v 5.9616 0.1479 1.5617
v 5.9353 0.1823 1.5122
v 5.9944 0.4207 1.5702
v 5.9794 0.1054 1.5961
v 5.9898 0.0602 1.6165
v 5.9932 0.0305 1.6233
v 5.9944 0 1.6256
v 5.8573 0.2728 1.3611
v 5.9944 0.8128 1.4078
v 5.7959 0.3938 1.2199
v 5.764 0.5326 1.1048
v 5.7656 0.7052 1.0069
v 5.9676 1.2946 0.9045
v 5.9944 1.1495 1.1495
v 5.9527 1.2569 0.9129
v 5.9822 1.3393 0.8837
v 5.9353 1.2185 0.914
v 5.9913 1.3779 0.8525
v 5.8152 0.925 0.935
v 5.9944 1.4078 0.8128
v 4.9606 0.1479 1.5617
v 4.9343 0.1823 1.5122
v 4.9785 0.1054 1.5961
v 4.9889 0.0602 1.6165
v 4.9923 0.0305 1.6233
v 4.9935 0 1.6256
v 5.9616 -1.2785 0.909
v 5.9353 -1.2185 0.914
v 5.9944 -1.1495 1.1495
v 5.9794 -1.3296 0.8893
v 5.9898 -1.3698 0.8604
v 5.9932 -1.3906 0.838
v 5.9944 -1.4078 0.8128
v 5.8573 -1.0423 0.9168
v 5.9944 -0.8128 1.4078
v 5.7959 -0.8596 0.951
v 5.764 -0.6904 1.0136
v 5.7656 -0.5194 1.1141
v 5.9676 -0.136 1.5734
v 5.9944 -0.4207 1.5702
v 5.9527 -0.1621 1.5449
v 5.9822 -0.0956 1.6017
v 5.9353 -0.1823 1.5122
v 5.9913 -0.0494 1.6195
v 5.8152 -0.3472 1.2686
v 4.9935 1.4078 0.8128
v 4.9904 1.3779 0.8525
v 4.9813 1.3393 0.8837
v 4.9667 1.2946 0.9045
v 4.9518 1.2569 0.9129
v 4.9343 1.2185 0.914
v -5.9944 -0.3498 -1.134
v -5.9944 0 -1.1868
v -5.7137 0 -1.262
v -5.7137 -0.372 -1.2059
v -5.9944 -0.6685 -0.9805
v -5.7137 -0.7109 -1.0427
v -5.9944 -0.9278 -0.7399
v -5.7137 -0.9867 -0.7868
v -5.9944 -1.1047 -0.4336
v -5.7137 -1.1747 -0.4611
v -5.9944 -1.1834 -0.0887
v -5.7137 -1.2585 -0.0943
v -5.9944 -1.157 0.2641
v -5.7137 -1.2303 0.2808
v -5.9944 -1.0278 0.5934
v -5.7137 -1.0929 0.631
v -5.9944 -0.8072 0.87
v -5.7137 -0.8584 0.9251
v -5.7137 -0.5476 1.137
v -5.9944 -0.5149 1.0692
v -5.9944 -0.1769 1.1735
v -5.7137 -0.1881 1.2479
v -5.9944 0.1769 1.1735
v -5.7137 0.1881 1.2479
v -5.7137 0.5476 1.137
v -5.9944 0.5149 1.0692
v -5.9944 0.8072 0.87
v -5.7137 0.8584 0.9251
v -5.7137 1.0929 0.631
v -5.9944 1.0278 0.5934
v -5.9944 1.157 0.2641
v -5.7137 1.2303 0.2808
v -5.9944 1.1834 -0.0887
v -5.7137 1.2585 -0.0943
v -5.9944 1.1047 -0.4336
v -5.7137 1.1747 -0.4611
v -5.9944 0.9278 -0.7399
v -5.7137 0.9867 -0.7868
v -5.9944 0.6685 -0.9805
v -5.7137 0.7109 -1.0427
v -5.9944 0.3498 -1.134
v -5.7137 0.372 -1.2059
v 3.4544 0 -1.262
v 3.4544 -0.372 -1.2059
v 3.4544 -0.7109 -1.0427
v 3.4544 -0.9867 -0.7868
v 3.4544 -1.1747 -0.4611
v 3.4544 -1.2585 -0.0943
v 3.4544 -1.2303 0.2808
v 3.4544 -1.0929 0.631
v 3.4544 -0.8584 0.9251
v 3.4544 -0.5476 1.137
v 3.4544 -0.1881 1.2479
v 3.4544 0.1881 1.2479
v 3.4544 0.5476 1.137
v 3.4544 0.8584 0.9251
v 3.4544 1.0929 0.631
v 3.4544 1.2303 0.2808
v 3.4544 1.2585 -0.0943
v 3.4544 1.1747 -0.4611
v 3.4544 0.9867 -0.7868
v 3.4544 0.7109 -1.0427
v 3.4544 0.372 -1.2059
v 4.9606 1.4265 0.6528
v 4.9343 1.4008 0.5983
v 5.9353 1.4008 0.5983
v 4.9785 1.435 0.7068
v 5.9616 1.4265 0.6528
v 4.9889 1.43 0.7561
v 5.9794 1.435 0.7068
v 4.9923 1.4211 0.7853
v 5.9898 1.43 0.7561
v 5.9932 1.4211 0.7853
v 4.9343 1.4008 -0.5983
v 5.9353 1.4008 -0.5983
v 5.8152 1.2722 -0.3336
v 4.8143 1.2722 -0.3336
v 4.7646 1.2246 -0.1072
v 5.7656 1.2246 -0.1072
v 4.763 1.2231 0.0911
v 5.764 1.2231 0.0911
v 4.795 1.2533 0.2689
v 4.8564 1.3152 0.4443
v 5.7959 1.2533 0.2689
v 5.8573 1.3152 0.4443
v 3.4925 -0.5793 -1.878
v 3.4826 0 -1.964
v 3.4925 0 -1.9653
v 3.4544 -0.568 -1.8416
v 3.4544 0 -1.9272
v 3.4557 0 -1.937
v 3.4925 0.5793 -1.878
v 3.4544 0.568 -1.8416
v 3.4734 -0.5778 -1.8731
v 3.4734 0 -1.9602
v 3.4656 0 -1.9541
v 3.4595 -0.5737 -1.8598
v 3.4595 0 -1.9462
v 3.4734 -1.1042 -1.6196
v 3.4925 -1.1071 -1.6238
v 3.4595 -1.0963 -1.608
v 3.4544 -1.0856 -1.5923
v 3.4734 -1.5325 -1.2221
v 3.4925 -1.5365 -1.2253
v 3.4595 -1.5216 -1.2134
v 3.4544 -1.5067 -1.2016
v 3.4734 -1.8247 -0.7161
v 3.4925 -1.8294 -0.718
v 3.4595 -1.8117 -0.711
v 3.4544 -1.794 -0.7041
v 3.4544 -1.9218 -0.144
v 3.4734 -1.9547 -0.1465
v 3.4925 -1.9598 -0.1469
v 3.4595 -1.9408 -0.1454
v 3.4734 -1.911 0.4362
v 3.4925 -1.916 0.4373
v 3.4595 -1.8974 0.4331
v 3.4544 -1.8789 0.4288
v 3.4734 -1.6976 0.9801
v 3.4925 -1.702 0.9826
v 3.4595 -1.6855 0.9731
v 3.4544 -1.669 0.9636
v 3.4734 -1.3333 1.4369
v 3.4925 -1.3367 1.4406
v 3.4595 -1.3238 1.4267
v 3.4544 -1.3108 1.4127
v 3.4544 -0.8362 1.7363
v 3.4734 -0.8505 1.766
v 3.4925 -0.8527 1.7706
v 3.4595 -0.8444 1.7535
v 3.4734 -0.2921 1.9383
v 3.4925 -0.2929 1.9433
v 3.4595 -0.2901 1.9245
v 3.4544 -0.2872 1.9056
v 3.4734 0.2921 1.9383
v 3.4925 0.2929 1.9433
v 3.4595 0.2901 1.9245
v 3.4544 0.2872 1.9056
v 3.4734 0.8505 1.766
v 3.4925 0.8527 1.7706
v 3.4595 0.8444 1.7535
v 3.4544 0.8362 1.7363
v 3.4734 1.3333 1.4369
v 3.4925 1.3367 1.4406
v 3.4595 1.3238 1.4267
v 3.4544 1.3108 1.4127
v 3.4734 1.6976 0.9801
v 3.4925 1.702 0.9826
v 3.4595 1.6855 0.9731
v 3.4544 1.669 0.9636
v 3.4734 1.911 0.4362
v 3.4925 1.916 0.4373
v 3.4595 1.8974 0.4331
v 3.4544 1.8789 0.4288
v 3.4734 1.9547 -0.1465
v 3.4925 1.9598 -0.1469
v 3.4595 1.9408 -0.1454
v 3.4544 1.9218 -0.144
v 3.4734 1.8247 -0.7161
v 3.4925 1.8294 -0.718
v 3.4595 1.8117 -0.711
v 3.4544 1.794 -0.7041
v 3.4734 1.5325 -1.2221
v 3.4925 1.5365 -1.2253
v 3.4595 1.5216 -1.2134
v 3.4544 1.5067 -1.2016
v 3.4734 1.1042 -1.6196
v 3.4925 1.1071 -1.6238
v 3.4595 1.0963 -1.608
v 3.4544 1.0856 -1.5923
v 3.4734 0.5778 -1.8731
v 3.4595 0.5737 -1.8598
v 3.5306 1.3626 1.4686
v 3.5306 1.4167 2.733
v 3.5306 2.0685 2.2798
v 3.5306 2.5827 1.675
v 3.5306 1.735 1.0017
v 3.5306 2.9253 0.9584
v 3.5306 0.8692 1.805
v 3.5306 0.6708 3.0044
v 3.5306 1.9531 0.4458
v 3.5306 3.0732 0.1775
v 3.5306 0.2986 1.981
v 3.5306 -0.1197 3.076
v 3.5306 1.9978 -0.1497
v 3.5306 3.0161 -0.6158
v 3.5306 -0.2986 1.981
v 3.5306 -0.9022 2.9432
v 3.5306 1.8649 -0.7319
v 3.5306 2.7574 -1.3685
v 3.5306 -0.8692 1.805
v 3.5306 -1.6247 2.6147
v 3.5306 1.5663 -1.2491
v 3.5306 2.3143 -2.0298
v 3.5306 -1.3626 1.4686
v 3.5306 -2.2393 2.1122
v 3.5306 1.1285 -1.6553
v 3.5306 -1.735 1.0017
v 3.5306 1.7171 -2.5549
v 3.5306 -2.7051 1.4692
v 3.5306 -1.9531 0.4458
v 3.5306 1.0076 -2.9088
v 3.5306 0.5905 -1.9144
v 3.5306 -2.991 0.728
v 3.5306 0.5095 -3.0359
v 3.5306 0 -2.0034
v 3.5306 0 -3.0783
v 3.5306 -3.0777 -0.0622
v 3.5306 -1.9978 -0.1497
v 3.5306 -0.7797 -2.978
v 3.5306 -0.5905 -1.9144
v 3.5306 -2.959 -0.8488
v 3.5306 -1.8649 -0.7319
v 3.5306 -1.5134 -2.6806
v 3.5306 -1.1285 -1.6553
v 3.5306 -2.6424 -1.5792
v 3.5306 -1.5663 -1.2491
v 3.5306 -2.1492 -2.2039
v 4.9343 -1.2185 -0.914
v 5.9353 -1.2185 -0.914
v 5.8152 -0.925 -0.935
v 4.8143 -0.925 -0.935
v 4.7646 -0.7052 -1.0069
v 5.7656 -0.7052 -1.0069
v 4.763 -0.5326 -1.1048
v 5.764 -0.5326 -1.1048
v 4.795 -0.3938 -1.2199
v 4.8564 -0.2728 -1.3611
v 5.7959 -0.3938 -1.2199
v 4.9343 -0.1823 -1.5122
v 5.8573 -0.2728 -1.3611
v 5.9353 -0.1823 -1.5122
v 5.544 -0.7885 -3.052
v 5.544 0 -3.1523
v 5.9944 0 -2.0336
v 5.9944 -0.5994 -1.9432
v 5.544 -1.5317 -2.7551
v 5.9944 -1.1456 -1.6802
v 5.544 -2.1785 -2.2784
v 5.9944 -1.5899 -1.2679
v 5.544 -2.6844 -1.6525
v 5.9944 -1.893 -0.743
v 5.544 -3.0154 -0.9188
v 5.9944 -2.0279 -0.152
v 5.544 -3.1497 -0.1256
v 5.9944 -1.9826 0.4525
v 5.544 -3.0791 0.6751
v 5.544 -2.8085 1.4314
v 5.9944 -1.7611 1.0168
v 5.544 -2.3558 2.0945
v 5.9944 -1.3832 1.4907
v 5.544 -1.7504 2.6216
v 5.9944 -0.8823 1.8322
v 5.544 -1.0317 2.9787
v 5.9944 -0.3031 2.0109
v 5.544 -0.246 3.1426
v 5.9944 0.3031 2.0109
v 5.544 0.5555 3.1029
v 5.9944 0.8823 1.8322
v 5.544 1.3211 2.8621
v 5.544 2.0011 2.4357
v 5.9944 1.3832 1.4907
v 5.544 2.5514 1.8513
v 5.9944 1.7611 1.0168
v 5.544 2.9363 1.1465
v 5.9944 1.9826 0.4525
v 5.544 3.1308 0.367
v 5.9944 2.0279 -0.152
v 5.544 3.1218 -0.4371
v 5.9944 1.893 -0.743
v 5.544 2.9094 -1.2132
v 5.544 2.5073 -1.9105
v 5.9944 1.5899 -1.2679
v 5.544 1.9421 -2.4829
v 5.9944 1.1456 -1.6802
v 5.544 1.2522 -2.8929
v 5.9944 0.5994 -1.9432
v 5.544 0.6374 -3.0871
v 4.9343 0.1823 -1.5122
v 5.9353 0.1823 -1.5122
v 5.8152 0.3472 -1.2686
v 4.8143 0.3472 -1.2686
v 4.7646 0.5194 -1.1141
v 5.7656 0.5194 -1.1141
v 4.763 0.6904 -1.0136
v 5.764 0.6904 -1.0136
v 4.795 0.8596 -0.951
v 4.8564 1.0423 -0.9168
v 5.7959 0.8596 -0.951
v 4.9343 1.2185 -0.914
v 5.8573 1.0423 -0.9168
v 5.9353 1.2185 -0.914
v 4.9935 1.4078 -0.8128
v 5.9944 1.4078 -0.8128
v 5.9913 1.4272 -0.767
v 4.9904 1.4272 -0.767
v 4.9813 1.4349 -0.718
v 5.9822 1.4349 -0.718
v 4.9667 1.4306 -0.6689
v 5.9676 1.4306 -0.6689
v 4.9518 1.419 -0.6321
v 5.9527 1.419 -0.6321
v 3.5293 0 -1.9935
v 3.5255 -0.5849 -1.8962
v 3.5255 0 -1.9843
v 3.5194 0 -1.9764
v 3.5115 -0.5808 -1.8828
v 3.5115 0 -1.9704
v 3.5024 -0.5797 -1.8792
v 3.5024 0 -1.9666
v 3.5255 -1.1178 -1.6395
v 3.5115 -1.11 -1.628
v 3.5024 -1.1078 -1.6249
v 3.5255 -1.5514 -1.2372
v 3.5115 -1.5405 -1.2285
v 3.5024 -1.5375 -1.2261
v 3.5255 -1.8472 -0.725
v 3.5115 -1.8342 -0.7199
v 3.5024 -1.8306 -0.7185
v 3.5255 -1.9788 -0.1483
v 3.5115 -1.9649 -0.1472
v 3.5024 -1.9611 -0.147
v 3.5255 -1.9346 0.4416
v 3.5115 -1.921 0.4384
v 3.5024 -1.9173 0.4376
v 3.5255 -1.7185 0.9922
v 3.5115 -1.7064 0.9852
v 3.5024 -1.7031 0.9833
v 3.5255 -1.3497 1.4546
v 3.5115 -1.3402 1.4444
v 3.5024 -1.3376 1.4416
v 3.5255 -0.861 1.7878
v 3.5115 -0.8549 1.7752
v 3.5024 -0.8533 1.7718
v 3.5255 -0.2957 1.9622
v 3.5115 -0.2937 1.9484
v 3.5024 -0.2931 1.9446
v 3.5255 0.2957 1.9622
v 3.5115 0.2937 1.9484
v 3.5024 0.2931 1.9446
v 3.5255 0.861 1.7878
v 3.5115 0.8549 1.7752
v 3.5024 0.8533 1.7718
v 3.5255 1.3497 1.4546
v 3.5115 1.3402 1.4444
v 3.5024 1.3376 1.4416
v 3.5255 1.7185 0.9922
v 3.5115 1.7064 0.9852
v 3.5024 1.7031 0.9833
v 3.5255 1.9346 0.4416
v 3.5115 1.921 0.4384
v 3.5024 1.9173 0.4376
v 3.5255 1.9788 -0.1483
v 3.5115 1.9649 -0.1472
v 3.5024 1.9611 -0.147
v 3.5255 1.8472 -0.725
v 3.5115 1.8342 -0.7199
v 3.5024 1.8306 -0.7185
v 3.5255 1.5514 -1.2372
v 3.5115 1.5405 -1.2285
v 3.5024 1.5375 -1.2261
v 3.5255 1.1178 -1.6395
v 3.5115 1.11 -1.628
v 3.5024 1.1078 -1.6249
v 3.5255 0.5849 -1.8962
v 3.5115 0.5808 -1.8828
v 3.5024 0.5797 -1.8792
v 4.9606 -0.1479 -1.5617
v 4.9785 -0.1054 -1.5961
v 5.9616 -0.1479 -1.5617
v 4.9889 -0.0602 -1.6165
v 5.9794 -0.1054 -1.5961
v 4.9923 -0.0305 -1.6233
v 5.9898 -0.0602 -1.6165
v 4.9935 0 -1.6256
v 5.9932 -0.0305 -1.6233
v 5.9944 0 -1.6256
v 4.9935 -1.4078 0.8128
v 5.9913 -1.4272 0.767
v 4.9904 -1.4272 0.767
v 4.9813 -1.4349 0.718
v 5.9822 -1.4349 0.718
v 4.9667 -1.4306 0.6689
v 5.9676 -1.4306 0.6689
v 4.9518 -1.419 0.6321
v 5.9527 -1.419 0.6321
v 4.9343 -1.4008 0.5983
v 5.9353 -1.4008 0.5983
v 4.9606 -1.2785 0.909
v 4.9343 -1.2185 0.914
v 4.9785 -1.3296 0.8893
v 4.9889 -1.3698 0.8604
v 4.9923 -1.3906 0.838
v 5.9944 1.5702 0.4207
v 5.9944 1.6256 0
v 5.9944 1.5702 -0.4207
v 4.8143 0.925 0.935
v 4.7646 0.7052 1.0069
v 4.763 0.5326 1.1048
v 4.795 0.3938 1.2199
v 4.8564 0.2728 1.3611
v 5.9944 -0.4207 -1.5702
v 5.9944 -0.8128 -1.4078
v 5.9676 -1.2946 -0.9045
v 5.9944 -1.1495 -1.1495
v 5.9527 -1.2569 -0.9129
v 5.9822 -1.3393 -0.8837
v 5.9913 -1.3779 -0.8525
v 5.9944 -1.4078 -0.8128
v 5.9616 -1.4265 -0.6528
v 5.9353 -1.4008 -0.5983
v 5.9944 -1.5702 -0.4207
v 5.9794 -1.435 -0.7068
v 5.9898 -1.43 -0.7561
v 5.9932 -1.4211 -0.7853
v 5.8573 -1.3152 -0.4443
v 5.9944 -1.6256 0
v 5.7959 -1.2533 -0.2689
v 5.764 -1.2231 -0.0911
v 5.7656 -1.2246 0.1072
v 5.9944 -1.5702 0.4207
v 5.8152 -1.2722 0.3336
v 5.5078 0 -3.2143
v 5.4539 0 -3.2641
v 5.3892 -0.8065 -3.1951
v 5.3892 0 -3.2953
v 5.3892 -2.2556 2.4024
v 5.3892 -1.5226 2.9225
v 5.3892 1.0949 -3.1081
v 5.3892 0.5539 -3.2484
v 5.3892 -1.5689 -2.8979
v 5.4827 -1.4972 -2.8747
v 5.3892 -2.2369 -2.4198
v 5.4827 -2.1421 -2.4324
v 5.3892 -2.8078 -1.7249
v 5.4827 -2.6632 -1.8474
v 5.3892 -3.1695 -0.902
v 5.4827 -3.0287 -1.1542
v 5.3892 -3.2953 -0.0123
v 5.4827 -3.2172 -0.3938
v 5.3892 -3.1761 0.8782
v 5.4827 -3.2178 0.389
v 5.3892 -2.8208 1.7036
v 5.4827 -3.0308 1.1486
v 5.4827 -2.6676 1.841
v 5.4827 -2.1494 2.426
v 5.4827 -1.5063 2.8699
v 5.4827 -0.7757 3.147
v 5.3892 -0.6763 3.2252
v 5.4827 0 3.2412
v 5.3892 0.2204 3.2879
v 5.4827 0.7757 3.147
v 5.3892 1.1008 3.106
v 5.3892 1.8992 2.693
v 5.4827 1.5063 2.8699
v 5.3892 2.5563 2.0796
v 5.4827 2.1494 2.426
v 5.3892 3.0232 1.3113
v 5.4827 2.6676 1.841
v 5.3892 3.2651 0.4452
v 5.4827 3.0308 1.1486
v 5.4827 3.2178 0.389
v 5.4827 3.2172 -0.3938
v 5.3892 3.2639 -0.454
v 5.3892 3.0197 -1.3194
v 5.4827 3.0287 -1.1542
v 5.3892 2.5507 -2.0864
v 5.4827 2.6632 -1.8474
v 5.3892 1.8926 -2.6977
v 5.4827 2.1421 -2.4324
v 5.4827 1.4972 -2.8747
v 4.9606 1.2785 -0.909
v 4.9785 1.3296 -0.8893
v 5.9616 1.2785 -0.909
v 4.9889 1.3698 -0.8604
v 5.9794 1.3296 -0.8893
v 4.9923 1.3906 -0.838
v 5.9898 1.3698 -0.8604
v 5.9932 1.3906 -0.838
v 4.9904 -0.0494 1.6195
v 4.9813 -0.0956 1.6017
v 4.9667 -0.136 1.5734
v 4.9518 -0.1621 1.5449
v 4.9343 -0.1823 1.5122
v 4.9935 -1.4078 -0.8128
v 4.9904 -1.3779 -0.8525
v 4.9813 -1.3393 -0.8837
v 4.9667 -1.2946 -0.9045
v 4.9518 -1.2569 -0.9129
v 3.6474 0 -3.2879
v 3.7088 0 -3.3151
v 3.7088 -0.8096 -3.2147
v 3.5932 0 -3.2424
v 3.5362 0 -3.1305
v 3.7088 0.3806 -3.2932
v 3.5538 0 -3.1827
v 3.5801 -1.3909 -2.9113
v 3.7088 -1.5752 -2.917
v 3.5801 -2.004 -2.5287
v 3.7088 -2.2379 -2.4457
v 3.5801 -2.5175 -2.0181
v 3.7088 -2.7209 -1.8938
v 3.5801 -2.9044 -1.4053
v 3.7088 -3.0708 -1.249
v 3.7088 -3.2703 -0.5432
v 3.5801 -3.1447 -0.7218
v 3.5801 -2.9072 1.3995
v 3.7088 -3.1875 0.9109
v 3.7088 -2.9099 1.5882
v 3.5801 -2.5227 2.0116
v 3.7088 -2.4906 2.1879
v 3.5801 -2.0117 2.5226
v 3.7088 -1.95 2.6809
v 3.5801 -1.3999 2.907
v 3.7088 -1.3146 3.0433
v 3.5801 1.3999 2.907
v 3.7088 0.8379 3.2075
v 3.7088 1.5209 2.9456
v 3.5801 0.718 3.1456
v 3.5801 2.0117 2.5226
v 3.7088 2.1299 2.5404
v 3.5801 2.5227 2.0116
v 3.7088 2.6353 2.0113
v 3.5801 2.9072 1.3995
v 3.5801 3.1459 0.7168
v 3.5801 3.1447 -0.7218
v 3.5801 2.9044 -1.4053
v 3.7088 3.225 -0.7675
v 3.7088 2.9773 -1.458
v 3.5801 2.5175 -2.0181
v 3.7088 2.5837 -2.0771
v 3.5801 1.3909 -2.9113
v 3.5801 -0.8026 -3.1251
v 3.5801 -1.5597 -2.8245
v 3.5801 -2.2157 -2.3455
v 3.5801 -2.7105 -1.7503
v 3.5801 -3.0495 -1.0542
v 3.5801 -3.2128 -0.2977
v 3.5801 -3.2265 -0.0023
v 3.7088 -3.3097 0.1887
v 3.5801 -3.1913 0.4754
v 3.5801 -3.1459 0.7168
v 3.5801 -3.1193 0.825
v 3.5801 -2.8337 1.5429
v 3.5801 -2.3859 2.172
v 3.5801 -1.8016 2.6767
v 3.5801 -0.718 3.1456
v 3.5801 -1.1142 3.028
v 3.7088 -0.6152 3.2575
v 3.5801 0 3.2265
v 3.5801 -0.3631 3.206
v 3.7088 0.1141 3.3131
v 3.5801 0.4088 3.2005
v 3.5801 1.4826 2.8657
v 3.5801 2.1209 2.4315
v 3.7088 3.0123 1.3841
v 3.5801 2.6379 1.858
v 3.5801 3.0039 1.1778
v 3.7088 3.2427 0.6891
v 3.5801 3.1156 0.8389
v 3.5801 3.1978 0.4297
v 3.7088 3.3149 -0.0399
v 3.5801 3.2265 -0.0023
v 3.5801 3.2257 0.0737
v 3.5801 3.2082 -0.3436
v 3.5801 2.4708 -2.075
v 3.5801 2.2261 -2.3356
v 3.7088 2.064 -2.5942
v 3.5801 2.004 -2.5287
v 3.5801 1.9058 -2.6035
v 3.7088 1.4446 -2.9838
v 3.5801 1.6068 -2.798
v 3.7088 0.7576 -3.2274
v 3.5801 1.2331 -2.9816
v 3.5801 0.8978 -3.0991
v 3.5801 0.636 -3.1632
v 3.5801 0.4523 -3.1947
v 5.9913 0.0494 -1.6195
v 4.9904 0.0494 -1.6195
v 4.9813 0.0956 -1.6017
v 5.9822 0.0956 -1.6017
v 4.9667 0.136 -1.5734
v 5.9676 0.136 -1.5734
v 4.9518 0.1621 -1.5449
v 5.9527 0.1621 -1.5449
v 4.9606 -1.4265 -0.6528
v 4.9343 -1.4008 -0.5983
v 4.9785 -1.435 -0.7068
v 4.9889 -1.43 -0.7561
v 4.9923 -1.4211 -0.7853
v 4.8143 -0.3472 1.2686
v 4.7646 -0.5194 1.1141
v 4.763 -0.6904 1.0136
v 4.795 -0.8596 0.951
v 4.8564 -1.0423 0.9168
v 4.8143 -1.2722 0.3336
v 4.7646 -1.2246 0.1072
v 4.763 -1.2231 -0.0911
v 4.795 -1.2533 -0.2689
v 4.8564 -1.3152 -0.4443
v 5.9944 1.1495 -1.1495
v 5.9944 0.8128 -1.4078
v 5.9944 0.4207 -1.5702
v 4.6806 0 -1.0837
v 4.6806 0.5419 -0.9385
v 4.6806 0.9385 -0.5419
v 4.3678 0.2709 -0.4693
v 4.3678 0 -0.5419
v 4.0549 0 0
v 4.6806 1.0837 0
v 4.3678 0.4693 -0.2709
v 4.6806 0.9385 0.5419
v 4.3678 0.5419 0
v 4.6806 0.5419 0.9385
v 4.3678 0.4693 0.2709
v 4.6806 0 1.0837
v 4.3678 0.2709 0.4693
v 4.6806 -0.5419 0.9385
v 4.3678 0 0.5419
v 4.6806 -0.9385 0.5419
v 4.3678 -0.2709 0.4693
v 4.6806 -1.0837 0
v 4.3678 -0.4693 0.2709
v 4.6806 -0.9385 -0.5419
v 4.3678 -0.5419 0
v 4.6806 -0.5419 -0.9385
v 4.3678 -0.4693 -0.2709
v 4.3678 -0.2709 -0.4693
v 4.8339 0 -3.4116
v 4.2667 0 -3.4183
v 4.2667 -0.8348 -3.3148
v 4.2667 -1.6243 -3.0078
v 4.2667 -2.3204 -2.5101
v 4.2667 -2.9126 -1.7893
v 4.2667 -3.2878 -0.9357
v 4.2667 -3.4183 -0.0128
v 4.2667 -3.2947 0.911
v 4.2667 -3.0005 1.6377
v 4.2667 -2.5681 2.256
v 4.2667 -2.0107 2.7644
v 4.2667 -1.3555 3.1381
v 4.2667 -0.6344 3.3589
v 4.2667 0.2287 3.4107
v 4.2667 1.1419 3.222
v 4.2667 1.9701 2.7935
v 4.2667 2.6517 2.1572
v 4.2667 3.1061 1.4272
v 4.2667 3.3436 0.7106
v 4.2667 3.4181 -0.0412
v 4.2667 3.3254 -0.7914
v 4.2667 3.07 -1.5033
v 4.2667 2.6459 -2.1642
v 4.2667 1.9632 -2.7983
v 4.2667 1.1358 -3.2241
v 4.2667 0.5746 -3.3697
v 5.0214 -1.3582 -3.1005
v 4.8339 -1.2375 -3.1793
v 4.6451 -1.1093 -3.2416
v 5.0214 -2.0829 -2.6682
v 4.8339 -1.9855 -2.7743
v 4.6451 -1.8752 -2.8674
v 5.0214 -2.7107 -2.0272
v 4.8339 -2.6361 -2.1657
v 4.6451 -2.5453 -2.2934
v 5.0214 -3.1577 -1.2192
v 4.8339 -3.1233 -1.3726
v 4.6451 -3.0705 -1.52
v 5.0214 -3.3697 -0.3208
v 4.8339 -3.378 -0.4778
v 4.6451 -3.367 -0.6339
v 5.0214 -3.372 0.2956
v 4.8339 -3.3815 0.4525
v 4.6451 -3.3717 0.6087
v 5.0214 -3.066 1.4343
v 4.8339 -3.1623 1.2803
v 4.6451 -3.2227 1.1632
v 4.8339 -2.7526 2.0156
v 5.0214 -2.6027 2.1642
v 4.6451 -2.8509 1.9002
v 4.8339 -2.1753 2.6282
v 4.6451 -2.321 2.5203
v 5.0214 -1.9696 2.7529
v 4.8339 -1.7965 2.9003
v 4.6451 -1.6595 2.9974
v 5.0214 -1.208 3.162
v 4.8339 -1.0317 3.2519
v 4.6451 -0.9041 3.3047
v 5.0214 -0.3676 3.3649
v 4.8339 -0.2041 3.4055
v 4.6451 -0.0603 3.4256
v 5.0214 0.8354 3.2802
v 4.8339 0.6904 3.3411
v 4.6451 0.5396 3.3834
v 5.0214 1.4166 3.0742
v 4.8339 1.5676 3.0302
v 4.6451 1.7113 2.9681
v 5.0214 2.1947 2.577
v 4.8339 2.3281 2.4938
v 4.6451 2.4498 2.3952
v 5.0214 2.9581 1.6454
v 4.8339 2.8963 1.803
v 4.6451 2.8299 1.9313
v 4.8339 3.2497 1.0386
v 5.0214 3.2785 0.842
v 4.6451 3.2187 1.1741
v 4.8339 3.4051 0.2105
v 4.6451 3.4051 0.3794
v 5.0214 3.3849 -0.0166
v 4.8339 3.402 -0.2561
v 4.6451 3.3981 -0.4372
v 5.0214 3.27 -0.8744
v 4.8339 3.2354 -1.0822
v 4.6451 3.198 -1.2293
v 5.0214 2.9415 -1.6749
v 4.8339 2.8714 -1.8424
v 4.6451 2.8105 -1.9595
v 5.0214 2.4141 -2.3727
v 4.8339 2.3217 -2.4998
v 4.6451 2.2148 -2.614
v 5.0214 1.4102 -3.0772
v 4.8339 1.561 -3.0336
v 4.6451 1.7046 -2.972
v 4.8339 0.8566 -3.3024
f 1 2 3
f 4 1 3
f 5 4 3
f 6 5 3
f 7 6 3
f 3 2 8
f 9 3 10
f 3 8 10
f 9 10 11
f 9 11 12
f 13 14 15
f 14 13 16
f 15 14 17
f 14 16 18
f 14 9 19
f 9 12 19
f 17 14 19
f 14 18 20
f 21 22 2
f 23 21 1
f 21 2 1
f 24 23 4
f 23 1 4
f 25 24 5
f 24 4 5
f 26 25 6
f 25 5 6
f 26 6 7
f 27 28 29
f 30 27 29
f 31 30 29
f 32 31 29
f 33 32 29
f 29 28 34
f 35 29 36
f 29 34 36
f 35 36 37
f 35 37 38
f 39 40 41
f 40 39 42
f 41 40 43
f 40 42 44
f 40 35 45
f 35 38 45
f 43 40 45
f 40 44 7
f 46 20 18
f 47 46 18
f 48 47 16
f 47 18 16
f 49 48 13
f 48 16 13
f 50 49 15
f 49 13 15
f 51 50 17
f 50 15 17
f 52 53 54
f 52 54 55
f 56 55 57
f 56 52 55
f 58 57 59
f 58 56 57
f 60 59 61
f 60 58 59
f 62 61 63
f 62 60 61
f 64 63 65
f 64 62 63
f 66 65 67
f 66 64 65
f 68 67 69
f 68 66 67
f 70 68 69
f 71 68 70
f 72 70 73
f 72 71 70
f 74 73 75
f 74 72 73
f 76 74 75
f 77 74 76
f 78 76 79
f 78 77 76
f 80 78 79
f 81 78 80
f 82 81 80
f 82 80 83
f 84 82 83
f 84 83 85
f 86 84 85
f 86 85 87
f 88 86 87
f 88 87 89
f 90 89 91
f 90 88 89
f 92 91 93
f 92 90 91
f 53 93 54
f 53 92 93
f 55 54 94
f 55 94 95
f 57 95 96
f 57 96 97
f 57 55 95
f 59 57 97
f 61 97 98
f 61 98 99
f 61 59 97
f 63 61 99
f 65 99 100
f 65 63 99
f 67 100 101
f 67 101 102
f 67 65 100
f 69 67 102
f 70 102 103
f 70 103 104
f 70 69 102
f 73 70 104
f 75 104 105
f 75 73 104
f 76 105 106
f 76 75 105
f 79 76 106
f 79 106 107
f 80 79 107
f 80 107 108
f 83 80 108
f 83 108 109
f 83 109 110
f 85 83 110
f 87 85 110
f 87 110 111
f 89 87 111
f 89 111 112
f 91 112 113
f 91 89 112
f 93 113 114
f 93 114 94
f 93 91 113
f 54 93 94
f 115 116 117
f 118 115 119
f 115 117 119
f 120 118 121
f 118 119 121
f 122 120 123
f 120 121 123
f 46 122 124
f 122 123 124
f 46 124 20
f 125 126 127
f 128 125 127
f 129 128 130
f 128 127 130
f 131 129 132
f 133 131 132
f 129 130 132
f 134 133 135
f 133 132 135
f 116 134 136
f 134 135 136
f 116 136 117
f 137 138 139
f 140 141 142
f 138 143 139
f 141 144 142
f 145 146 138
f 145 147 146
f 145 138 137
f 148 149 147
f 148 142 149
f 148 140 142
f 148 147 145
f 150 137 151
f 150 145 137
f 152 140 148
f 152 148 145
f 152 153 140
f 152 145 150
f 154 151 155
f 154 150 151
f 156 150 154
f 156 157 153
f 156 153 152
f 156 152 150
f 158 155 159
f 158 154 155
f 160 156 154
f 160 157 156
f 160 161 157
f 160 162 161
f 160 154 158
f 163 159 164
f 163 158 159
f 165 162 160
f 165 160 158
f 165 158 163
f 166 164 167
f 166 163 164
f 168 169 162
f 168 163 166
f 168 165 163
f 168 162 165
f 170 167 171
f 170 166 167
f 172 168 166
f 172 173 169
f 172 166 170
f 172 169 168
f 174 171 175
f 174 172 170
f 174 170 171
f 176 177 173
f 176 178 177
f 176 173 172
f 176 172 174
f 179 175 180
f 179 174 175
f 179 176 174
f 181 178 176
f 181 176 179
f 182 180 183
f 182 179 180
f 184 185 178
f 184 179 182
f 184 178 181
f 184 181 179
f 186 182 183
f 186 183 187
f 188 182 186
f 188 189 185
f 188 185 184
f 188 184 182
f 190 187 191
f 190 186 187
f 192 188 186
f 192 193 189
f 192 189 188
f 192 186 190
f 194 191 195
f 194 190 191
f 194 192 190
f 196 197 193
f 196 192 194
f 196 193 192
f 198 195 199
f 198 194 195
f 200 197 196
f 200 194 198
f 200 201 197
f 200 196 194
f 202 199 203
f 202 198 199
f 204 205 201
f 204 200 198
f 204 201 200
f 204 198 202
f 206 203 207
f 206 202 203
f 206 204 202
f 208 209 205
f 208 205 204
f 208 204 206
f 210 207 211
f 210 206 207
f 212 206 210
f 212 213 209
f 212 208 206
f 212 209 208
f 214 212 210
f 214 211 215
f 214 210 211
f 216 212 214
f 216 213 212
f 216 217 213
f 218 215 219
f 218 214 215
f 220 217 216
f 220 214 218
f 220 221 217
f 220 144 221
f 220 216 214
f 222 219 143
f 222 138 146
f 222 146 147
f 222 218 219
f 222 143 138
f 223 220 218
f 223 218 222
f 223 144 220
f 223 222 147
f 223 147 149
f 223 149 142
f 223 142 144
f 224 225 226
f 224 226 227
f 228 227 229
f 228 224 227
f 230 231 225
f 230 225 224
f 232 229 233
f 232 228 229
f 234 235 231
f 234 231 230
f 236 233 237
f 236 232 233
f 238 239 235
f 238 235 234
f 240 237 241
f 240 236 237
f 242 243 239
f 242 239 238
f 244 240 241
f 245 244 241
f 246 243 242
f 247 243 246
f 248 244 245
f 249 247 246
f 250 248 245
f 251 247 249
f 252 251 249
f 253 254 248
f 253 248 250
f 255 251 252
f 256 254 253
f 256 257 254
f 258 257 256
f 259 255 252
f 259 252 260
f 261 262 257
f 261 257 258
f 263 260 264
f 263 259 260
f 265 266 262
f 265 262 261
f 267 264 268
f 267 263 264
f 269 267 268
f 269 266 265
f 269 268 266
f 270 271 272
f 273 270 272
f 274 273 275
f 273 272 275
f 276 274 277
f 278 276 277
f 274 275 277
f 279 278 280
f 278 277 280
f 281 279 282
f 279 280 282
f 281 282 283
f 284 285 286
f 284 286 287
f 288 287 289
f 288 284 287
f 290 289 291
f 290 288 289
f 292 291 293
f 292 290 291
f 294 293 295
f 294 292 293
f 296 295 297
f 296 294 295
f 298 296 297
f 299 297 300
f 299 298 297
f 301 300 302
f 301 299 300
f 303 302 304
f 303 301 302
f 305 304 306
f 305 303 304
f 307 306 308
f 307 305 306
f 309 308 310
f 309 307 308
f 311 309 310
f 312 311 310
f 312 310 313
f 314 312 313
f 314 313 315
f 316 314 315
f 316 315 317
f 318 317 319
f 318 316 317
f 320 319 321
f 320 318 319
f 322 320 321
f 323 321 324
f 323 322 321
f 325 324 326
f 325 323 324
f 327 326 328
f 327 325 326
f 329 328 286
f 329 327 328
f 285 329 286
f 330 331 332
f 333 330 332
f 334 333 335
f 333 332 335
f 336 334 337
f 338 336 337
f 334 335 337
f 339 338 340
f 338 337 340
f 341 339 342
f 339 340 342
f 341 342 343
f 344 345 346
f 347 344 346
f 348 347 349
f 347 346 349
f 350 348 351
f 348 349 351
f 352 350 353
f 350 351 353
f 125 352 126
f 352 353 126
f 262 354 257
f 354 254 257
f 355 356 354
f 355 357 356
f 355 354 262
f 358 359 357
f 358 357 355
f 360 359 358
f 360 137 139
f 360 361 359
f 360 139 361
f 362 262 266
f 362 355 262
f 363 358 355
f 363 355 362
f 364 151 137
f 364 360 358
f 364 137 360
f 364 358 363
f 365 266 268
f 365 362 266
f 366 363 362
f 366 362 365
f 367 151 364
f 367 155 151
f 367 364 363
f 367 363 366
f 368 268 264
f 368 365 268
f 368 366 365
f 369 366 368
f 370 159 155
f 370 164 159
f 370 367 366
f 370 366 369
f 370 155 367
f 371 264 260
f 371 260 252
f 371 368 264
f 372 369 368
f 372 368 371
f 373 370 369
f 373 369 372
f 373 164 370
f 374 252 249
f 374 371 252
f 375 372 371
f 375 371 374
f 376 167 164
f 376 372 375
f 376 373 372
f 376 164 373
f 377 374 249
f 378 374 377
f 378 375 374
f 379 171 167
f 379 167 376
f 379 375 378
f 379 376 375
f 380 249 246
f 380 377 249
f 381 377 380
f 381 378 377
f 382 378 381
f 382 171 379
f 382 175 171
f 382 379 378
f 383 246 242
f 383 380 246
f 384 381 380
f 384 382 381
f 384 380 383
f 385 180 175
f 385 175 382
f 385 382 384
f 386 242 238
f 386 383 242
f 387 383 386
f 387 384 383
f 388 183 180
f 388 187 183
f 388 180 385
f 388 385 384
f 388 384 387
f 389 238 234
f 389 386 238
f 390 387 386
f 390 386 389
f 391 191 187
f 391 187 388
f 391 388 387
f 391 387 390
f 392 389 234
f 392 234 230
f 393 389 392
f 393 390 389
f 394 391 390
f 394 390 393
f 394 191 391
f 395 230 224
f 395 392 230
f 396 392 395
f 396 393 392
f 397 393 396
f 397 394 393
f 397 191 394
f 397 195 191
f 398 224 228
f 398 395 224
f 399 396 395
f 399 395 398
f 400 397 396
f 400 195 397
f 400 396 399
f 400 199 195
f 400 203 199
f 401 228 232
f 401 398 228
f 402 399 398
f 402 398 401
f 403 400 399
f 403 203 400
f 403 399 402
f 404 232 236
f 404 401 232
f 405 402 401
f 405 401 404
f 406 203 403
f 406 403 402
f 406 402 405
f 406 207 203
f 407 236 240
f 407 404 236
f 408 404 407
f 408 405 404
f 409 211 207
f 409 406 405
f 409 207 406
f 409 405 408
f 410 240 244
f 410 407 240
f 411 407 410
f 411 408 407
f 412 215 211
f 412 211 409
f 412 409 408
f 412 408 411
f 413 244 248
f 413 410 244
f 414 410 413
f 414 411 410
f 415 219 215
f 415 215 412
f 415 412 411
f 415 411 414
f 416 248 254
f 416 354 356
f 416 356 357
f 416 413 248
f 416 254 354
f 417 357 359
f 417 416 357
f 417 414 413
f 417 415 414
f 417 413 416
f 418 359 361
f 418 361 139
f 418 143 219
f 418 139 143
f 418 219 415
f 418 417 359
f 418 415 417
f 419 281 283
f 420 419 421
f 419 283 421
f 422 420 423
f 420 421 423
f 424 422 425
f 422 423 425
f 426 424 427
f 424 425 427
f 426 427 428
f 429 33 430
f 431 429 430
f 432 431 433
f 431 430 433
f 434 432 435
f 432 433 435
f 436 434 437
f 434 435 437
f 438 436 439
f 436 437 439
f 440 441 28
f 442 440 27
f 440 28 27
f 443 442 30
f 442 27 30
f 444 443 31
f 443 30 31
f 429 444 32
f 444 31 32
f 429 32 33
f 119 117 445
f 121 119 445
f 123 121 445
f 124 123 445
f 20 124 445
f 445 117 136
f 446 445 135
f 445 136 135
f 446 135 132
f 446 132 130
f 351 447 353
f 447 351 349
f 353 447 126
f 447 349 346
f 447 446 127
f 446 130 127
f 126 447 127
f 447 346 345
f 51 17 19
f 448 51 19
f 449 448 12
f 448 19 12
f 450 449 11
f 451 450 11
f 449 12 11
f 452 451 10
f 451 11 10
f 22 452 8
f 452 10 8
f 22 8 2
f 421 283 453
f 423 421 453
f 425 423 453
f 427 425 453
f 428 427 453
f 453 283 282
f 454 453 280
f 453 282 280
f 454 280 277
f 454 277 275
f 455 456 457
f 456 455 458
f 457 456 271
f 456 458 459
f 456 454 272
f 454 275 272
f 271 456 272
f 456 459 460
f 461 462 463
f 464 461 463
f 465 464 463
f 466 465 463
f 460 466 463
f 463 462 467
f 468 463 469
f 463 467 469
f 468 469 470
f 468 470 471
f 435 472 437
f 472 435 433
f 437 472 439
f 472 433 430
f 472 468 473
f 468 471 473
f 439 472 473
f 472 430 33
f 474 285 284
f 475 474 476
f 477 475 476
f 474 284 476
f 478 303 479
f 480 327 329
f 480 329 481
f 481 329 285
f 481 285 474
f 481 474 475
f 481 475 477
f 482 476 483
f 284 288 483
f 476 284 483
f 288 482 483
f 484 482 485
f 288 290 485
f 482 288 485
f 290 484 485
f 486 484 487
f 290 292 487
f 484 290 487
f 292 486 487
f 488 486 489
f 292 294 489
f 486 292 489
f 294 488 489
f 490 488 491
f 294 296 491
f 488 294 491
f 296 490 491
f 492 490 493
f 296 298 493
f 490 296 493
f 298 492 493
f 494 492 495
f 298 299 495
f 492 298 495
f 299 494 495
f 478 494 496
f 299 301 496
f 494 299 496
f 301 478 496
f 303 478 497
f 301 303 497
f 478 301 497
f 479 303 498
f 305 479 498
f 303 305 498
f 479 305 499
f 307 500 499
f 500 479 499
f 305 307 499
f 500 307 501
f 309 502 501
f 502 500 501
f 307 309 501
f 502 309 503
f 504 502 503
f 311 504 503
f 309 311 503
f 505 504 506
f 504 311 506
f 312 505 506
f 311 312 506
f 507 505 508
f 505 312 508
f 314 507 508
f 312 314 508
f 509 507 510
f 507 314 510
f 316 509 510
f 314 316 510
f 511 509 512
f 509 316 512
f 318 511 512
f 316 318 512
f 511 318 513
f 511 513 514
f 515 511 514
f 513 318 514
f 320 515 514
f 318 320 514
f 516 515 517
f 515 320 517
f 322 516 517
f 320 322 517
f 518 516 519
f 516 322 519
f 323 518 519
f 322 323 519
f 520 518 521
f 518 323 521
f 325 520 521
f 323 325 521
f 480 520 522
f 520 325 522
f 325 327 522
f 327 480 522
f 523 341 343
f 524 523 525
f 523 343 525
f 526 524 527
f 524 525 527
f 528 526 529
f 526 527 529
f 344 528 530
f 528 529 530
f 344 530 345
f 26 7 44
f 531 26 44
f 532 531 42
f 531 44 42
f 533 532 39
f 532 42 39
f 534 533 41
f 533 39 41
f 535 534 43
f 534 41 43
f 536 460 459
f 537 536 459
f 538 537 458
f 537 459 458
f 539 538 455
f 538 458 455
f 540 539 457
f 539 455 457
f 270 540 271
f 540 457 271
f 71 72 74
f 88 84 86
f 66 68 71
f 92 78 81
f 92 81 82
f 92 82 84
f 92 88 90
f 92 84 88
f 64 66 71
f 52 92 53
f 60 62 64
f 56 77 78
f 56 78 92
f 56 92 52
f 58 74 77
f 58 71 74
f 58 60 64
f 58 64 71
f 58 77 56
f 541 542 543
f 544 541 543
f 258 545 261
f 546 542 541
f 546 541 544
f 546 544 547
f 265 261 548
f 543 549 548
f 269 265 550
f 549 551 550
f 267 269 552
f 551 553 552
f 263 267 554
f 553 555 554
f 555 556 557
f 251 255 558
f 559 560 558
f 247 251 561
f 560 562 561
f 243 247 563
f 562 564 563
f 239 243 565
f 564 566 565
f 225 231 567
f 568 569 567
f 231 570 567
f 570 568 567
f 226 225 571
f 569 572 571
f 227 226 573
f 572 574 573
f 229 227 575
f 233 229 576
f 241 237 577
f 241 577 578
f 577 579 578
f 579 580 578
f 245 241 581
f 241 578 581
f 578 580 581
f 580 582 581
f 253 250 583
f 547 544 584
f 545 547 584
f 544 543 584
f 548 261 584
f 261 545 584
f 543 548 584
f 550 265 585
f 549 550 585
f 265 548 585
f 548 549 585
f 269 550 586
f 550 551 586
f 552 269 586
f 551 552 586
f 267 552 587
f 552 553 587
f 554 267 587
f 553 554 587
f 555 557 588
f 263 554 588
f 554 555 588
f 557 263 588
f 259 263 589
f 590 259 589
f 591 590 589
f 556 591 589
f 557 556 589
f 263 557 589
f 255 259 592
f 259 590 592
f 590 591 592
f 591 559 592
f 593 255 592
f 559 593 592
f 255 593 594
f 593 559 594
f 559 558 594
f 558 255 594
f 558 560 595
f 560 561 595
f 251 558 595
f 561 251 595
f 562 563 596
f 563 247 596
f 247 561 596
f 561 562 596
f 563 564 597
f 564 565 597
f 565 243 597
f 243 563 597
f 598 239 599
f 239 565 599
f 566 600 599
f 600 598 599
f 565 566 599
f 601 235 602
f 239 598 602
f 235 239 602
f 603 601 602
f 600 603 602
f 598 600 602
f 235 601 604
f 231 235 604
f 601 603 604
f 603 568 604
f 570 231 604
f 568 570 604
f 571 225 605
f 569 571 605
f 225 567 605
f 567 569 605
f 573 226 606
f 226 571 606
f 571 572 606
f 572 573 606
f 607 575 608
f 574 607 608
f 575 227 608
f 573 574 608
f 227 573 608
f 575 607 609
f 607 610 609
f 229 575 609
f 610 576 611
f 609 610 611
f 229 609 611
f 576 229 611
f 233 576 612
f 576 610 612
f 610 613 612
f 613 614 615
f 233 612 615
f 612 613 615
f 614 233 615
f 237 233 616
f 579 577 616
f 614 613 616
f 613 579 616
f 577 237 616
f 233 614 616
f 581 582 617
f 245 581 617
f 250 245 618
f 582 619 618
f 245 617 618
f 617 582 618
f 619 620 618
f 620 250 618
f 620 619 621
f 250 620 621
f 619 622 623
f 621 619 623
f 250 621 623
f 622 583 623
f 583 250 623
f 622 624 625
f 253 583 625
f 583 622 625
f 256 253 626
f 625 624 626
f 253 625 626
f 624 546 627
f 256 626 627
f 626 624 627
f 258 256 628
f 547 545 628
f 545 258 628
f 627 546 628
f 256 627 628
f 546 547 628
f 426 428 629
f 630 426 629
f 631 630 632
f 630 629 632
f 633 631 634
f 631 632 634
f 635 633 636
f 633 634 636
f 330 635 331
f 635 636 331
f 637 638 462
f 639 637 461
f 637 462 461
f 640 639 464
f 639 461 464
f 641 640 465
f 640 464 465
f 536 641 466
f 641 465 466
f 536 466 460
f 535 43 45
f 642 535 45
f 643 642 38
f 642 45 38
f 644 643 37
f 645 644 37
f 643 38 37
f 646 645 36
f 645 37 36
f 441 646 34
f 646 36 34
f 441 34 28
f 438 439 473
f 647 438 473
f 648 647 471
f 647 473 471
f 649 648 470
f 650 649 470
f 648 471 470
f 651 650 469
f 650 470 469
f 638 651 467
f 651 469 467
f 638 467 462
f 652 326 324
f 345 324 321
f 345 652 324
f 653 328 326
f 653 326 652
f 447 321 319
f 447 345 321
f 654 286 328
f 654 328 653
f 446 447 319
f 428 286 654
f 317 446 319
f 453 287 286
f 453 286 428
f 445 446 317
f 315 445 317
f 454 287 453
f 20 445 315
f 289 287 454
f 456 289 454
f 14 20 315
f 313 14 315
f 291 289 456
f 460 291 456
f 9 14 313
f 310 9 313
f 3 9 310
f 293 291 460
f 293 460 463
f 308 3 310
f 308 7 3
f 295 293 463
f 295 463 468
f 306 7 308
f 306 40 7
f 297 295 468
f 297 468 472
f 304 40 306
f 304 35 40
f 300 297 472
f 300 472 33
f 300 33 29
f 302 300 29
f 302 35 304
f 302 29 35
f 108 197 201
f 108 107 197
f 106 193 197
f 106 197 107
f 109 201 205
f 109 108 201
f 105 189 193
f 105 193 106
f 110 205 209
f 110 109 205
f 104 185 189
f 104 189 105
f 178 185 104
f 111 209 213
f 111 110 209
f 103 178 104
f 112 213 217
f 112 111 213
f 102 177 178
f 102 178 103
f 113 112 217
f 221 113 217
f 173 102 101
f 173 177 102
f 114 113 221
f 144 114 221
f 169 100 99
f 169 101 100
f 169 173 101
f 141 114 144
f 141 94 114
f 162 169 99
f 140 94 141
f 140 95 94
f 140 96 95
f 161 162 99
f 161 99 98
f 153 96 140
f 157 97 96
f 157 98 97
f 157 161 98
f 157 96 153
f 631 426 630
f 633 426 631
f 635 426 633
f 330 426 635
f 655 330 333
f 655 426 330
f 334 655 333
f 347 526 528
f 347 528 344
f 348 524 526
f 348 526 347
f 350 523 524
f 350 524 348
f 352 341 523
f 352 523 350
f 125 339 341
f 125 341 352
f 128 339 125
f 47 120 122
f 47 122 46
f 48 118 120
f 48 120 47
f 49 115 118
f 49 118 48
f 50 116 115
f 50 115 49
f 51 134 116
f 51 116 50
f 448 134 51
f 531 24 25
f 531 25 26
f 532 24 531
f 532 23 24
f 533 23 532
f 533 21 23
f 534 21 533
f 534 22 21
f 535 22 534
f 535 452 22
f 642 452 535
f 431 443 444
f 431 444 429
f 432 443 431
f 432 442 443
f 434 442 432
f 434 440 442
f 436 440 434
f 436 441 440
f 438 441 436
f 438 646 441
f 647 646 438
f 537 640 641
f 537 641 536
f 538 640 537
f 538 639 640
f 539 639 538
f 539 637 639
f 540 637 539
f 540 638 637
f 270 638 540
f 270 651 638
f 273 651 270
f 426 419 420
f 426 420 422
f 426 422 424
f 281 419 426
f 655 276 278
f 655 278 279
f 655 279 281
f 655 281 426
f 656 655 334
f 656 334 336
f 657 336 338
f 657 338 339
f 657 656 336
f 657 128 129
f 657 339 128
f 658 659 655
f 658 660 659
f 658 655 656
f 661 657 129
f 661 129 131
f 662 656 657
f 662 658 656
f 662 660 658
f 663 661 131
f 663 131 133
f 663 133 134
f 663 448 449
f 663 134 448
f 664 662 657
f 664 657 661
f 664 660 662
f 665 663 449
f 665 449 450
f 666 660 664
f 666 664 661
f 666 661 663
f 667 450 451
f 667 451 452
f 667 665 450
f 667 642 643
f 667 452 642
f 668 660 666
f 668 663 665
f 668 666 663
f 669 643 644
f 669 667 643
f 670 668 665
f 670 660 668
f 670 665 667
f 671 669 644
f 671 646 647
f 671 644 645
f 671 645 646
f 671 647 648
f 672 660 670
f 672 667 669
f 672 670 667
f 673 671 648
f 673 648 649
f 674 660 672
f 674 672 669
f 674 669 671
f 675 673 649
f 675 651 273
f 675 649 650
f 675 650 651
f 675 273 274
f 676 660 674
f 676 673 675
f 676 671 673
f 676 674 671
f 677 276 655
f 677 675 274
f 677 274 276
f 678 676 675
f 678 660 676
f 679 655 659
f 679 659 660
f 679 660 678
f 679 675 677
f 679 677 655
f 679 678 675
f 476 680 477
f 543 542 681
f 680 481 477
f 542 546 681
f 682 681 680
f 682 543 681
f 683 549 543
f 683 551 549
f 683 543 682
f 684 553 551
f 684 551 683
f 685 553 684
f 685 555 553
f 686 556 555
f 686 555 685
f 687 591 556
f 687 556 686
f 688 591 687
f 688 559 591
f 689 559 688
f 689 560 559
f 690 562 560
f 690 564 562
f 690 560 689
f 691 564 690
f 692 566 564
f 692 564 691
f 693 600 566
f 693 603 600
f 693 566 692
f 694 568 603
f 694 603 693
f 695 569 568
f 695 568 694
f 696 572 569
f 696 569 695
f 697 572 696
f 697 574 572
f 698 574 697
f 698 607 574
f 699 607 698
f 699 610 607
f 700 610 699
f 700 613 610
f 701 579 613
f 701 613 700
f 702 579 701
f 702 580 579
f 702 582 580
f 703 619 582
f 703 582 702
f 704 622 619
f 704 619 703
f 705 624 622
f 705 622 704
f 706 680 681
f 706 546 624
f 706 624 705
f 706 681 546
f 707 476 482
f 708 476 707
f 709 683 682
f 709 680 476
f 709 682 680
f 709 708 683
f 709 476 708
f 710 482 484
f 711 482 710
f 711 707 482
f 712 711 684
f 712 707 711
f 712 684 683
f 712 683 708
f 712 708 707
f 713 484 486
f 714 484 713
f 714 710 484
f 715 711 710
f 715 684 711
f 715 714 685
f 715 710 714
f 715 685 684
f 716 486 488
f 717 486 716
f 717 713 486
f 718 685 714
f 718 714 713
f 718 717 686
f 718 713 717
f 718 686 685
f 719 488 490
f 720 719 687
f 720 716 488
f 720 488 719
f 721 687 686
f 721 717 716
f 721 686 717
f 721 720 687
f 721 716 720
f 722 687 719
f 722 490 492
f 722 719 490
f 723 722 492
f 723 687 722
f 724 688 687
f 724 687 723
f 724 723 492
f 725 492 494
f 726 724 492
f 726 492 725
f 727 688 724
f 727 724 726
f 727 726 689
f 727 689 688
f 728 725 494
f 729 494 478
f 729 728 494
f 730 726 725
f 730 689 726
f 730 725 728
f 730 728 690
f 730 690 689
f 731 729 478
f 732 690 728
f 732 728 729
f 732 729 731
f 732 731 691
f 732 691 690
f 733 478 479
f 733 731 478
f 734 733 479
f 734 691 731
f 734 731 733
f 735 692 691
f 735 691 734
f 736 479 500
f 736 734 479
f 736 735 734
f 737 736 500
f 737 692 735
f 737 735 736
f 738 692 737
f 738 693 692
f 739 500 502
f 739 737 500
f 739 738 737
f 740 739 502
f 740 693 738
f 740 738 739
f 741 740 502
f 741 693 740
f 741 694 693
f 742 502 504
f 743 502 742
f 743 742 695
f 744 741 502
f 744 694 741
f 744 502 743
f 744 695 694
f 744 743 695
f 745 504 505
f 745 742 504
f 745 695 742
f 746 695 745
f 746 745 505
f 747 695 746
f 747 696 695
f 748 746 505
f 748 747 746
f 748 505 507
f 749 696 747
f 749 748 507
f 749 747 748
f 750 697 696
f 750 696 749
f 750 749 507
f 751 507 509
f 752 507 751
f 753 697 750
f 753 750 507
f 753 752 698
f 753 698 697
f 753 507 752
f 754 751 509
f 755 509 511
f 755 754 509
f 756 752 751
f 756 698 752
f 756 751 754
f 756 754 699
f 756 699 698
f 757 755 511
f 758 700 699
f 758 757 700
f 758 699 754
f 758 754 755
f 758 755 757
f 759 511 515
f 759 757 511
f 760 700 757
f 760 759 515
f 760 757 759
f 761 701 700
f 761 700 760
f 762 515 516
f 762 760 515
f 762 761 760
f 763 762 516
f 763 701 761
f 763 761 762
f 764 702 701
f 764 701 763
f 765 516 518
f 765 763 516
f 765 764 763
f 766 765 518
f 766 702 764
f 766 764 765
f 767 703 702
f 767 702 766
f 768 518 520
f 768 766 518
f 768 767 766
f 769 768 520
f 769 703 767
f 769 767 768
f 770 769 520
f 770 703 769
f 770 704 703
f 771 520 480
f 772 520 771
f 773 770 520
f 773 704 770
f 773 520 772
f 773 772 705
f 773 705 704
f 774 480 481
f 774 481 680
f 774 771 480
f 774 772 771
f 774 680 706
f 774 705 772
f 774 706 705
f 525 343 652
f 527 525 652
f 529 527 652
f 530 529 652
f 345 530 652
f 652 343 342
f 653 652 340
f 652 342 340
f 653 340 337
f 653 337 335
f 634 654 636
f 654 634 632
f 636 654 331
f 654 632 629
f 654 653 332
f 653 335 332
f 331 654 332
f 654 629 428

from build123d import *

# Parameters (mm, degrees)
BOSS_EXTRUDE1_REACH = 14.932
SKETCH3_R           = 2.0335875
FILLET1_R           = 0.24638
CHAMFER1_SIZE       = 0.280736842
CHAMFER1_SIZE2      = 0.07522321


with BuildPart() as part:
    # Sketch2 → Revolve1 (revolve)
    with BuildSketch(Plane.XY):
        with BuildLine():
            Line((-5.9944, 0), (5.9944, 0))
            Line((5.9944, 0), (5.9944, 2.0335875))
            Line((5.9944, 2.0335875), (5.50164, 3.25755))
            ThreePointArc((5.50164, 3.25755), (4.51612, 3.429), (3.5306, 3.25755))
            Line((3.5306, 3.25755), (3.5306, 2.003369298))
            ThreePointArc((3.5306, 2.003369298), (3.519440768, 1.97642853), (3.4925, 1.965269298))
            ThreePointArc((3.4925, 1.965269298), (3.465559232, 1.954110067), (3.4544, 1.927169298))
            Line((3.4544, 1.927169298), (3.4544, 1.261978947))
            Line((3.4544, 1.261978947), (-5.9944, 1.261978947))
            Line((-5.9944, 1.261978947), (-5.9944, 0))
        make_face()
    revolve(axis=Axis((-5.9944, 0, 0), (-1, 0, 0)))

    # Sketch12 → Cut-Revolve3 (revolve, cut)
    with BuildSketch(Plane.XY):
        Polygon((5.9944, 1.6256), (4.99348125, 1.6256), (4.054940652, 0), (5.9944, 0), align=None)
    revolve(axis=Axis((-5.9944, 0, 0), (1, 0, 0)), mode=Mode.SUBTRACT)

    # Boss-Extrude1: up to this cone (the profile starts inside it)
    boss_extrude1_end = Plane(origin=(5.9944, 0, 0), z_dir=(1, 0, 0)).offset(-1.939458348) * Cone(1.732e-06, 35.906628234, 20.730700477, align=(Align.CENTER, Align.CENTER, Align.MIN), mode=Mode.PRIVATE)
    # Sketch3 → Boss-Extrude1 (add, up to the surface)
    with BuildSketch(Plane(origin=(5.9944, 0, 0), x_dir=(0, 0, -1), z_dir=(1, 0, 0)), mode=Mode.PRIVATE) as boss_extrude1_sk1:
        Circle(SKETCH3_R)
        with BuildLine():
            ThreePointArc((1.51222877, -0.182266377), (1.594944844, -0.107324354), (1.6256, 0))
            ThreePointArc((1.6256, 0), (1.594944844, 0.107324354), (1.51222877, 0.182266377))
            ThreePointArc((1.51222877, 0.182266377), (1.055858172, 0.6096), (0.913961698, 1.218495343))
            ThreePointArc((0.913961698, 1.218495343), (0.890418039, 1.327600575), (0.8128, 1.407810896))
            ThreePointArc((0.8128, 1.407810896), (0.704526805, 1.434924929), (0.598267073, 1.40076172))
            ThreePointArc((0.598267073, 1.40076172), (0, 1.2192), (-0.598267073, 1.40076172))
            ThreePointArc((-0.598267073, 1.40076172), (-0.704526805, 1.434924929), (-0.8128, 1.407810896))
            ThreePointArc((-0.8128, 1.407810896), (-0.890418039, 1.327600575), (-0.913961698, 1.218495343))
            ThreePointArc((-0.913961698, 1.218495343), (-1.055858172, 0.6096), (-1.51222877, 0.182266377))
            ThreePointArc((-1.51222877, 0.182266377), (-1.594944844, 0.107324354), (-1.6256, 0))
            ThreePointArc((-1.6256, 0), (-1.594944844, -0.107324354), (-1.51222877, -0.182266377))
            ThreePointArc((-1.51222877, -0.182266377), (-1.055858172, -0.6096), (-0.913961698, -1.218495343))
            ThreePointArc((-0.913961698, -1.218495343), (-0.890418039, -1.327600575), (-0.8128, -1.407810896))
            ThreePointArc((-0.8128, -1.407810896), (-0.704526805, -1.434924929), (-0.598267073, -1.40076172))
            ThreePointArc((-0.598267073, -1.40076172), (0, -1.2192), (0.598267073, -1.40076172))
            ThreePointArc((0.598267073, -1.40076172), (0.704526805, -1.434924929), (0.8128, -1.407810896))
            ThreePointArc((0.8128, -1.407810896), (0.890418039, -1.327600575), (0.913961698, -1.218495343))
            ThreePointArc((0.913961698, -1.218495343), (1.055858172, -0.6096), (1.51222877, -0.182266377))
        make_face(mode=Mode.SUBTRACT)
    boss_extrude1_tool1 = extrude(boss_extrude1_sk1.sketch, amount=-BOSS_EXTRUDE1_REACH, mode=Mode.PRIVATE) & boss_extrude1_end
    add(boss_extrude1_tool1.solids().sort_by_distance((5.9944, 0, 1.976069))[0])

    # Cut-Extrude2 cone 1 section (through the dimple's axis) → Cut-Extrude2 (revolve, cut)
    with BuildSketch(Plane(origin=(5.9944, 0, 0), x_dir=(0, 0, -1), z_dir=(0, 1, 0))):
        Polygon((0, 0), (1.6256, 0), (0, 0.938540598), align=None)
    revolve(axis=Axis((5.9944, 0, 0), (-1, 0, 0)), mode=Mode.SUBTRACT)

    # Fillet1
    fillet1_edges = [part.edges().sort_by_distance(p)[0] for p in [
        (3.5306, -3.25755, 0),
        (5.50164, -3.25755, 0),
    ]]
    fillet(fillet1_edges, radius=FILLET1_R)

    # Chamfer1
    chamfer1_edges = [part.edges().sort_by_distance(p)[0] for p in [
        (-5.9944, -1.261978947, 0),
    ]]
    chamfer1_side = [part.faces().sort_by_distance(p)[0] for p in [
        (-1.27, -1.261978947, 0),
    ]]
    chamfer(chamfer1_edges, length=CHAMFER1_SIZE, length2=CHAMFER1_SIZE2, reference=chamfer1_side[0])


solid = part.part
